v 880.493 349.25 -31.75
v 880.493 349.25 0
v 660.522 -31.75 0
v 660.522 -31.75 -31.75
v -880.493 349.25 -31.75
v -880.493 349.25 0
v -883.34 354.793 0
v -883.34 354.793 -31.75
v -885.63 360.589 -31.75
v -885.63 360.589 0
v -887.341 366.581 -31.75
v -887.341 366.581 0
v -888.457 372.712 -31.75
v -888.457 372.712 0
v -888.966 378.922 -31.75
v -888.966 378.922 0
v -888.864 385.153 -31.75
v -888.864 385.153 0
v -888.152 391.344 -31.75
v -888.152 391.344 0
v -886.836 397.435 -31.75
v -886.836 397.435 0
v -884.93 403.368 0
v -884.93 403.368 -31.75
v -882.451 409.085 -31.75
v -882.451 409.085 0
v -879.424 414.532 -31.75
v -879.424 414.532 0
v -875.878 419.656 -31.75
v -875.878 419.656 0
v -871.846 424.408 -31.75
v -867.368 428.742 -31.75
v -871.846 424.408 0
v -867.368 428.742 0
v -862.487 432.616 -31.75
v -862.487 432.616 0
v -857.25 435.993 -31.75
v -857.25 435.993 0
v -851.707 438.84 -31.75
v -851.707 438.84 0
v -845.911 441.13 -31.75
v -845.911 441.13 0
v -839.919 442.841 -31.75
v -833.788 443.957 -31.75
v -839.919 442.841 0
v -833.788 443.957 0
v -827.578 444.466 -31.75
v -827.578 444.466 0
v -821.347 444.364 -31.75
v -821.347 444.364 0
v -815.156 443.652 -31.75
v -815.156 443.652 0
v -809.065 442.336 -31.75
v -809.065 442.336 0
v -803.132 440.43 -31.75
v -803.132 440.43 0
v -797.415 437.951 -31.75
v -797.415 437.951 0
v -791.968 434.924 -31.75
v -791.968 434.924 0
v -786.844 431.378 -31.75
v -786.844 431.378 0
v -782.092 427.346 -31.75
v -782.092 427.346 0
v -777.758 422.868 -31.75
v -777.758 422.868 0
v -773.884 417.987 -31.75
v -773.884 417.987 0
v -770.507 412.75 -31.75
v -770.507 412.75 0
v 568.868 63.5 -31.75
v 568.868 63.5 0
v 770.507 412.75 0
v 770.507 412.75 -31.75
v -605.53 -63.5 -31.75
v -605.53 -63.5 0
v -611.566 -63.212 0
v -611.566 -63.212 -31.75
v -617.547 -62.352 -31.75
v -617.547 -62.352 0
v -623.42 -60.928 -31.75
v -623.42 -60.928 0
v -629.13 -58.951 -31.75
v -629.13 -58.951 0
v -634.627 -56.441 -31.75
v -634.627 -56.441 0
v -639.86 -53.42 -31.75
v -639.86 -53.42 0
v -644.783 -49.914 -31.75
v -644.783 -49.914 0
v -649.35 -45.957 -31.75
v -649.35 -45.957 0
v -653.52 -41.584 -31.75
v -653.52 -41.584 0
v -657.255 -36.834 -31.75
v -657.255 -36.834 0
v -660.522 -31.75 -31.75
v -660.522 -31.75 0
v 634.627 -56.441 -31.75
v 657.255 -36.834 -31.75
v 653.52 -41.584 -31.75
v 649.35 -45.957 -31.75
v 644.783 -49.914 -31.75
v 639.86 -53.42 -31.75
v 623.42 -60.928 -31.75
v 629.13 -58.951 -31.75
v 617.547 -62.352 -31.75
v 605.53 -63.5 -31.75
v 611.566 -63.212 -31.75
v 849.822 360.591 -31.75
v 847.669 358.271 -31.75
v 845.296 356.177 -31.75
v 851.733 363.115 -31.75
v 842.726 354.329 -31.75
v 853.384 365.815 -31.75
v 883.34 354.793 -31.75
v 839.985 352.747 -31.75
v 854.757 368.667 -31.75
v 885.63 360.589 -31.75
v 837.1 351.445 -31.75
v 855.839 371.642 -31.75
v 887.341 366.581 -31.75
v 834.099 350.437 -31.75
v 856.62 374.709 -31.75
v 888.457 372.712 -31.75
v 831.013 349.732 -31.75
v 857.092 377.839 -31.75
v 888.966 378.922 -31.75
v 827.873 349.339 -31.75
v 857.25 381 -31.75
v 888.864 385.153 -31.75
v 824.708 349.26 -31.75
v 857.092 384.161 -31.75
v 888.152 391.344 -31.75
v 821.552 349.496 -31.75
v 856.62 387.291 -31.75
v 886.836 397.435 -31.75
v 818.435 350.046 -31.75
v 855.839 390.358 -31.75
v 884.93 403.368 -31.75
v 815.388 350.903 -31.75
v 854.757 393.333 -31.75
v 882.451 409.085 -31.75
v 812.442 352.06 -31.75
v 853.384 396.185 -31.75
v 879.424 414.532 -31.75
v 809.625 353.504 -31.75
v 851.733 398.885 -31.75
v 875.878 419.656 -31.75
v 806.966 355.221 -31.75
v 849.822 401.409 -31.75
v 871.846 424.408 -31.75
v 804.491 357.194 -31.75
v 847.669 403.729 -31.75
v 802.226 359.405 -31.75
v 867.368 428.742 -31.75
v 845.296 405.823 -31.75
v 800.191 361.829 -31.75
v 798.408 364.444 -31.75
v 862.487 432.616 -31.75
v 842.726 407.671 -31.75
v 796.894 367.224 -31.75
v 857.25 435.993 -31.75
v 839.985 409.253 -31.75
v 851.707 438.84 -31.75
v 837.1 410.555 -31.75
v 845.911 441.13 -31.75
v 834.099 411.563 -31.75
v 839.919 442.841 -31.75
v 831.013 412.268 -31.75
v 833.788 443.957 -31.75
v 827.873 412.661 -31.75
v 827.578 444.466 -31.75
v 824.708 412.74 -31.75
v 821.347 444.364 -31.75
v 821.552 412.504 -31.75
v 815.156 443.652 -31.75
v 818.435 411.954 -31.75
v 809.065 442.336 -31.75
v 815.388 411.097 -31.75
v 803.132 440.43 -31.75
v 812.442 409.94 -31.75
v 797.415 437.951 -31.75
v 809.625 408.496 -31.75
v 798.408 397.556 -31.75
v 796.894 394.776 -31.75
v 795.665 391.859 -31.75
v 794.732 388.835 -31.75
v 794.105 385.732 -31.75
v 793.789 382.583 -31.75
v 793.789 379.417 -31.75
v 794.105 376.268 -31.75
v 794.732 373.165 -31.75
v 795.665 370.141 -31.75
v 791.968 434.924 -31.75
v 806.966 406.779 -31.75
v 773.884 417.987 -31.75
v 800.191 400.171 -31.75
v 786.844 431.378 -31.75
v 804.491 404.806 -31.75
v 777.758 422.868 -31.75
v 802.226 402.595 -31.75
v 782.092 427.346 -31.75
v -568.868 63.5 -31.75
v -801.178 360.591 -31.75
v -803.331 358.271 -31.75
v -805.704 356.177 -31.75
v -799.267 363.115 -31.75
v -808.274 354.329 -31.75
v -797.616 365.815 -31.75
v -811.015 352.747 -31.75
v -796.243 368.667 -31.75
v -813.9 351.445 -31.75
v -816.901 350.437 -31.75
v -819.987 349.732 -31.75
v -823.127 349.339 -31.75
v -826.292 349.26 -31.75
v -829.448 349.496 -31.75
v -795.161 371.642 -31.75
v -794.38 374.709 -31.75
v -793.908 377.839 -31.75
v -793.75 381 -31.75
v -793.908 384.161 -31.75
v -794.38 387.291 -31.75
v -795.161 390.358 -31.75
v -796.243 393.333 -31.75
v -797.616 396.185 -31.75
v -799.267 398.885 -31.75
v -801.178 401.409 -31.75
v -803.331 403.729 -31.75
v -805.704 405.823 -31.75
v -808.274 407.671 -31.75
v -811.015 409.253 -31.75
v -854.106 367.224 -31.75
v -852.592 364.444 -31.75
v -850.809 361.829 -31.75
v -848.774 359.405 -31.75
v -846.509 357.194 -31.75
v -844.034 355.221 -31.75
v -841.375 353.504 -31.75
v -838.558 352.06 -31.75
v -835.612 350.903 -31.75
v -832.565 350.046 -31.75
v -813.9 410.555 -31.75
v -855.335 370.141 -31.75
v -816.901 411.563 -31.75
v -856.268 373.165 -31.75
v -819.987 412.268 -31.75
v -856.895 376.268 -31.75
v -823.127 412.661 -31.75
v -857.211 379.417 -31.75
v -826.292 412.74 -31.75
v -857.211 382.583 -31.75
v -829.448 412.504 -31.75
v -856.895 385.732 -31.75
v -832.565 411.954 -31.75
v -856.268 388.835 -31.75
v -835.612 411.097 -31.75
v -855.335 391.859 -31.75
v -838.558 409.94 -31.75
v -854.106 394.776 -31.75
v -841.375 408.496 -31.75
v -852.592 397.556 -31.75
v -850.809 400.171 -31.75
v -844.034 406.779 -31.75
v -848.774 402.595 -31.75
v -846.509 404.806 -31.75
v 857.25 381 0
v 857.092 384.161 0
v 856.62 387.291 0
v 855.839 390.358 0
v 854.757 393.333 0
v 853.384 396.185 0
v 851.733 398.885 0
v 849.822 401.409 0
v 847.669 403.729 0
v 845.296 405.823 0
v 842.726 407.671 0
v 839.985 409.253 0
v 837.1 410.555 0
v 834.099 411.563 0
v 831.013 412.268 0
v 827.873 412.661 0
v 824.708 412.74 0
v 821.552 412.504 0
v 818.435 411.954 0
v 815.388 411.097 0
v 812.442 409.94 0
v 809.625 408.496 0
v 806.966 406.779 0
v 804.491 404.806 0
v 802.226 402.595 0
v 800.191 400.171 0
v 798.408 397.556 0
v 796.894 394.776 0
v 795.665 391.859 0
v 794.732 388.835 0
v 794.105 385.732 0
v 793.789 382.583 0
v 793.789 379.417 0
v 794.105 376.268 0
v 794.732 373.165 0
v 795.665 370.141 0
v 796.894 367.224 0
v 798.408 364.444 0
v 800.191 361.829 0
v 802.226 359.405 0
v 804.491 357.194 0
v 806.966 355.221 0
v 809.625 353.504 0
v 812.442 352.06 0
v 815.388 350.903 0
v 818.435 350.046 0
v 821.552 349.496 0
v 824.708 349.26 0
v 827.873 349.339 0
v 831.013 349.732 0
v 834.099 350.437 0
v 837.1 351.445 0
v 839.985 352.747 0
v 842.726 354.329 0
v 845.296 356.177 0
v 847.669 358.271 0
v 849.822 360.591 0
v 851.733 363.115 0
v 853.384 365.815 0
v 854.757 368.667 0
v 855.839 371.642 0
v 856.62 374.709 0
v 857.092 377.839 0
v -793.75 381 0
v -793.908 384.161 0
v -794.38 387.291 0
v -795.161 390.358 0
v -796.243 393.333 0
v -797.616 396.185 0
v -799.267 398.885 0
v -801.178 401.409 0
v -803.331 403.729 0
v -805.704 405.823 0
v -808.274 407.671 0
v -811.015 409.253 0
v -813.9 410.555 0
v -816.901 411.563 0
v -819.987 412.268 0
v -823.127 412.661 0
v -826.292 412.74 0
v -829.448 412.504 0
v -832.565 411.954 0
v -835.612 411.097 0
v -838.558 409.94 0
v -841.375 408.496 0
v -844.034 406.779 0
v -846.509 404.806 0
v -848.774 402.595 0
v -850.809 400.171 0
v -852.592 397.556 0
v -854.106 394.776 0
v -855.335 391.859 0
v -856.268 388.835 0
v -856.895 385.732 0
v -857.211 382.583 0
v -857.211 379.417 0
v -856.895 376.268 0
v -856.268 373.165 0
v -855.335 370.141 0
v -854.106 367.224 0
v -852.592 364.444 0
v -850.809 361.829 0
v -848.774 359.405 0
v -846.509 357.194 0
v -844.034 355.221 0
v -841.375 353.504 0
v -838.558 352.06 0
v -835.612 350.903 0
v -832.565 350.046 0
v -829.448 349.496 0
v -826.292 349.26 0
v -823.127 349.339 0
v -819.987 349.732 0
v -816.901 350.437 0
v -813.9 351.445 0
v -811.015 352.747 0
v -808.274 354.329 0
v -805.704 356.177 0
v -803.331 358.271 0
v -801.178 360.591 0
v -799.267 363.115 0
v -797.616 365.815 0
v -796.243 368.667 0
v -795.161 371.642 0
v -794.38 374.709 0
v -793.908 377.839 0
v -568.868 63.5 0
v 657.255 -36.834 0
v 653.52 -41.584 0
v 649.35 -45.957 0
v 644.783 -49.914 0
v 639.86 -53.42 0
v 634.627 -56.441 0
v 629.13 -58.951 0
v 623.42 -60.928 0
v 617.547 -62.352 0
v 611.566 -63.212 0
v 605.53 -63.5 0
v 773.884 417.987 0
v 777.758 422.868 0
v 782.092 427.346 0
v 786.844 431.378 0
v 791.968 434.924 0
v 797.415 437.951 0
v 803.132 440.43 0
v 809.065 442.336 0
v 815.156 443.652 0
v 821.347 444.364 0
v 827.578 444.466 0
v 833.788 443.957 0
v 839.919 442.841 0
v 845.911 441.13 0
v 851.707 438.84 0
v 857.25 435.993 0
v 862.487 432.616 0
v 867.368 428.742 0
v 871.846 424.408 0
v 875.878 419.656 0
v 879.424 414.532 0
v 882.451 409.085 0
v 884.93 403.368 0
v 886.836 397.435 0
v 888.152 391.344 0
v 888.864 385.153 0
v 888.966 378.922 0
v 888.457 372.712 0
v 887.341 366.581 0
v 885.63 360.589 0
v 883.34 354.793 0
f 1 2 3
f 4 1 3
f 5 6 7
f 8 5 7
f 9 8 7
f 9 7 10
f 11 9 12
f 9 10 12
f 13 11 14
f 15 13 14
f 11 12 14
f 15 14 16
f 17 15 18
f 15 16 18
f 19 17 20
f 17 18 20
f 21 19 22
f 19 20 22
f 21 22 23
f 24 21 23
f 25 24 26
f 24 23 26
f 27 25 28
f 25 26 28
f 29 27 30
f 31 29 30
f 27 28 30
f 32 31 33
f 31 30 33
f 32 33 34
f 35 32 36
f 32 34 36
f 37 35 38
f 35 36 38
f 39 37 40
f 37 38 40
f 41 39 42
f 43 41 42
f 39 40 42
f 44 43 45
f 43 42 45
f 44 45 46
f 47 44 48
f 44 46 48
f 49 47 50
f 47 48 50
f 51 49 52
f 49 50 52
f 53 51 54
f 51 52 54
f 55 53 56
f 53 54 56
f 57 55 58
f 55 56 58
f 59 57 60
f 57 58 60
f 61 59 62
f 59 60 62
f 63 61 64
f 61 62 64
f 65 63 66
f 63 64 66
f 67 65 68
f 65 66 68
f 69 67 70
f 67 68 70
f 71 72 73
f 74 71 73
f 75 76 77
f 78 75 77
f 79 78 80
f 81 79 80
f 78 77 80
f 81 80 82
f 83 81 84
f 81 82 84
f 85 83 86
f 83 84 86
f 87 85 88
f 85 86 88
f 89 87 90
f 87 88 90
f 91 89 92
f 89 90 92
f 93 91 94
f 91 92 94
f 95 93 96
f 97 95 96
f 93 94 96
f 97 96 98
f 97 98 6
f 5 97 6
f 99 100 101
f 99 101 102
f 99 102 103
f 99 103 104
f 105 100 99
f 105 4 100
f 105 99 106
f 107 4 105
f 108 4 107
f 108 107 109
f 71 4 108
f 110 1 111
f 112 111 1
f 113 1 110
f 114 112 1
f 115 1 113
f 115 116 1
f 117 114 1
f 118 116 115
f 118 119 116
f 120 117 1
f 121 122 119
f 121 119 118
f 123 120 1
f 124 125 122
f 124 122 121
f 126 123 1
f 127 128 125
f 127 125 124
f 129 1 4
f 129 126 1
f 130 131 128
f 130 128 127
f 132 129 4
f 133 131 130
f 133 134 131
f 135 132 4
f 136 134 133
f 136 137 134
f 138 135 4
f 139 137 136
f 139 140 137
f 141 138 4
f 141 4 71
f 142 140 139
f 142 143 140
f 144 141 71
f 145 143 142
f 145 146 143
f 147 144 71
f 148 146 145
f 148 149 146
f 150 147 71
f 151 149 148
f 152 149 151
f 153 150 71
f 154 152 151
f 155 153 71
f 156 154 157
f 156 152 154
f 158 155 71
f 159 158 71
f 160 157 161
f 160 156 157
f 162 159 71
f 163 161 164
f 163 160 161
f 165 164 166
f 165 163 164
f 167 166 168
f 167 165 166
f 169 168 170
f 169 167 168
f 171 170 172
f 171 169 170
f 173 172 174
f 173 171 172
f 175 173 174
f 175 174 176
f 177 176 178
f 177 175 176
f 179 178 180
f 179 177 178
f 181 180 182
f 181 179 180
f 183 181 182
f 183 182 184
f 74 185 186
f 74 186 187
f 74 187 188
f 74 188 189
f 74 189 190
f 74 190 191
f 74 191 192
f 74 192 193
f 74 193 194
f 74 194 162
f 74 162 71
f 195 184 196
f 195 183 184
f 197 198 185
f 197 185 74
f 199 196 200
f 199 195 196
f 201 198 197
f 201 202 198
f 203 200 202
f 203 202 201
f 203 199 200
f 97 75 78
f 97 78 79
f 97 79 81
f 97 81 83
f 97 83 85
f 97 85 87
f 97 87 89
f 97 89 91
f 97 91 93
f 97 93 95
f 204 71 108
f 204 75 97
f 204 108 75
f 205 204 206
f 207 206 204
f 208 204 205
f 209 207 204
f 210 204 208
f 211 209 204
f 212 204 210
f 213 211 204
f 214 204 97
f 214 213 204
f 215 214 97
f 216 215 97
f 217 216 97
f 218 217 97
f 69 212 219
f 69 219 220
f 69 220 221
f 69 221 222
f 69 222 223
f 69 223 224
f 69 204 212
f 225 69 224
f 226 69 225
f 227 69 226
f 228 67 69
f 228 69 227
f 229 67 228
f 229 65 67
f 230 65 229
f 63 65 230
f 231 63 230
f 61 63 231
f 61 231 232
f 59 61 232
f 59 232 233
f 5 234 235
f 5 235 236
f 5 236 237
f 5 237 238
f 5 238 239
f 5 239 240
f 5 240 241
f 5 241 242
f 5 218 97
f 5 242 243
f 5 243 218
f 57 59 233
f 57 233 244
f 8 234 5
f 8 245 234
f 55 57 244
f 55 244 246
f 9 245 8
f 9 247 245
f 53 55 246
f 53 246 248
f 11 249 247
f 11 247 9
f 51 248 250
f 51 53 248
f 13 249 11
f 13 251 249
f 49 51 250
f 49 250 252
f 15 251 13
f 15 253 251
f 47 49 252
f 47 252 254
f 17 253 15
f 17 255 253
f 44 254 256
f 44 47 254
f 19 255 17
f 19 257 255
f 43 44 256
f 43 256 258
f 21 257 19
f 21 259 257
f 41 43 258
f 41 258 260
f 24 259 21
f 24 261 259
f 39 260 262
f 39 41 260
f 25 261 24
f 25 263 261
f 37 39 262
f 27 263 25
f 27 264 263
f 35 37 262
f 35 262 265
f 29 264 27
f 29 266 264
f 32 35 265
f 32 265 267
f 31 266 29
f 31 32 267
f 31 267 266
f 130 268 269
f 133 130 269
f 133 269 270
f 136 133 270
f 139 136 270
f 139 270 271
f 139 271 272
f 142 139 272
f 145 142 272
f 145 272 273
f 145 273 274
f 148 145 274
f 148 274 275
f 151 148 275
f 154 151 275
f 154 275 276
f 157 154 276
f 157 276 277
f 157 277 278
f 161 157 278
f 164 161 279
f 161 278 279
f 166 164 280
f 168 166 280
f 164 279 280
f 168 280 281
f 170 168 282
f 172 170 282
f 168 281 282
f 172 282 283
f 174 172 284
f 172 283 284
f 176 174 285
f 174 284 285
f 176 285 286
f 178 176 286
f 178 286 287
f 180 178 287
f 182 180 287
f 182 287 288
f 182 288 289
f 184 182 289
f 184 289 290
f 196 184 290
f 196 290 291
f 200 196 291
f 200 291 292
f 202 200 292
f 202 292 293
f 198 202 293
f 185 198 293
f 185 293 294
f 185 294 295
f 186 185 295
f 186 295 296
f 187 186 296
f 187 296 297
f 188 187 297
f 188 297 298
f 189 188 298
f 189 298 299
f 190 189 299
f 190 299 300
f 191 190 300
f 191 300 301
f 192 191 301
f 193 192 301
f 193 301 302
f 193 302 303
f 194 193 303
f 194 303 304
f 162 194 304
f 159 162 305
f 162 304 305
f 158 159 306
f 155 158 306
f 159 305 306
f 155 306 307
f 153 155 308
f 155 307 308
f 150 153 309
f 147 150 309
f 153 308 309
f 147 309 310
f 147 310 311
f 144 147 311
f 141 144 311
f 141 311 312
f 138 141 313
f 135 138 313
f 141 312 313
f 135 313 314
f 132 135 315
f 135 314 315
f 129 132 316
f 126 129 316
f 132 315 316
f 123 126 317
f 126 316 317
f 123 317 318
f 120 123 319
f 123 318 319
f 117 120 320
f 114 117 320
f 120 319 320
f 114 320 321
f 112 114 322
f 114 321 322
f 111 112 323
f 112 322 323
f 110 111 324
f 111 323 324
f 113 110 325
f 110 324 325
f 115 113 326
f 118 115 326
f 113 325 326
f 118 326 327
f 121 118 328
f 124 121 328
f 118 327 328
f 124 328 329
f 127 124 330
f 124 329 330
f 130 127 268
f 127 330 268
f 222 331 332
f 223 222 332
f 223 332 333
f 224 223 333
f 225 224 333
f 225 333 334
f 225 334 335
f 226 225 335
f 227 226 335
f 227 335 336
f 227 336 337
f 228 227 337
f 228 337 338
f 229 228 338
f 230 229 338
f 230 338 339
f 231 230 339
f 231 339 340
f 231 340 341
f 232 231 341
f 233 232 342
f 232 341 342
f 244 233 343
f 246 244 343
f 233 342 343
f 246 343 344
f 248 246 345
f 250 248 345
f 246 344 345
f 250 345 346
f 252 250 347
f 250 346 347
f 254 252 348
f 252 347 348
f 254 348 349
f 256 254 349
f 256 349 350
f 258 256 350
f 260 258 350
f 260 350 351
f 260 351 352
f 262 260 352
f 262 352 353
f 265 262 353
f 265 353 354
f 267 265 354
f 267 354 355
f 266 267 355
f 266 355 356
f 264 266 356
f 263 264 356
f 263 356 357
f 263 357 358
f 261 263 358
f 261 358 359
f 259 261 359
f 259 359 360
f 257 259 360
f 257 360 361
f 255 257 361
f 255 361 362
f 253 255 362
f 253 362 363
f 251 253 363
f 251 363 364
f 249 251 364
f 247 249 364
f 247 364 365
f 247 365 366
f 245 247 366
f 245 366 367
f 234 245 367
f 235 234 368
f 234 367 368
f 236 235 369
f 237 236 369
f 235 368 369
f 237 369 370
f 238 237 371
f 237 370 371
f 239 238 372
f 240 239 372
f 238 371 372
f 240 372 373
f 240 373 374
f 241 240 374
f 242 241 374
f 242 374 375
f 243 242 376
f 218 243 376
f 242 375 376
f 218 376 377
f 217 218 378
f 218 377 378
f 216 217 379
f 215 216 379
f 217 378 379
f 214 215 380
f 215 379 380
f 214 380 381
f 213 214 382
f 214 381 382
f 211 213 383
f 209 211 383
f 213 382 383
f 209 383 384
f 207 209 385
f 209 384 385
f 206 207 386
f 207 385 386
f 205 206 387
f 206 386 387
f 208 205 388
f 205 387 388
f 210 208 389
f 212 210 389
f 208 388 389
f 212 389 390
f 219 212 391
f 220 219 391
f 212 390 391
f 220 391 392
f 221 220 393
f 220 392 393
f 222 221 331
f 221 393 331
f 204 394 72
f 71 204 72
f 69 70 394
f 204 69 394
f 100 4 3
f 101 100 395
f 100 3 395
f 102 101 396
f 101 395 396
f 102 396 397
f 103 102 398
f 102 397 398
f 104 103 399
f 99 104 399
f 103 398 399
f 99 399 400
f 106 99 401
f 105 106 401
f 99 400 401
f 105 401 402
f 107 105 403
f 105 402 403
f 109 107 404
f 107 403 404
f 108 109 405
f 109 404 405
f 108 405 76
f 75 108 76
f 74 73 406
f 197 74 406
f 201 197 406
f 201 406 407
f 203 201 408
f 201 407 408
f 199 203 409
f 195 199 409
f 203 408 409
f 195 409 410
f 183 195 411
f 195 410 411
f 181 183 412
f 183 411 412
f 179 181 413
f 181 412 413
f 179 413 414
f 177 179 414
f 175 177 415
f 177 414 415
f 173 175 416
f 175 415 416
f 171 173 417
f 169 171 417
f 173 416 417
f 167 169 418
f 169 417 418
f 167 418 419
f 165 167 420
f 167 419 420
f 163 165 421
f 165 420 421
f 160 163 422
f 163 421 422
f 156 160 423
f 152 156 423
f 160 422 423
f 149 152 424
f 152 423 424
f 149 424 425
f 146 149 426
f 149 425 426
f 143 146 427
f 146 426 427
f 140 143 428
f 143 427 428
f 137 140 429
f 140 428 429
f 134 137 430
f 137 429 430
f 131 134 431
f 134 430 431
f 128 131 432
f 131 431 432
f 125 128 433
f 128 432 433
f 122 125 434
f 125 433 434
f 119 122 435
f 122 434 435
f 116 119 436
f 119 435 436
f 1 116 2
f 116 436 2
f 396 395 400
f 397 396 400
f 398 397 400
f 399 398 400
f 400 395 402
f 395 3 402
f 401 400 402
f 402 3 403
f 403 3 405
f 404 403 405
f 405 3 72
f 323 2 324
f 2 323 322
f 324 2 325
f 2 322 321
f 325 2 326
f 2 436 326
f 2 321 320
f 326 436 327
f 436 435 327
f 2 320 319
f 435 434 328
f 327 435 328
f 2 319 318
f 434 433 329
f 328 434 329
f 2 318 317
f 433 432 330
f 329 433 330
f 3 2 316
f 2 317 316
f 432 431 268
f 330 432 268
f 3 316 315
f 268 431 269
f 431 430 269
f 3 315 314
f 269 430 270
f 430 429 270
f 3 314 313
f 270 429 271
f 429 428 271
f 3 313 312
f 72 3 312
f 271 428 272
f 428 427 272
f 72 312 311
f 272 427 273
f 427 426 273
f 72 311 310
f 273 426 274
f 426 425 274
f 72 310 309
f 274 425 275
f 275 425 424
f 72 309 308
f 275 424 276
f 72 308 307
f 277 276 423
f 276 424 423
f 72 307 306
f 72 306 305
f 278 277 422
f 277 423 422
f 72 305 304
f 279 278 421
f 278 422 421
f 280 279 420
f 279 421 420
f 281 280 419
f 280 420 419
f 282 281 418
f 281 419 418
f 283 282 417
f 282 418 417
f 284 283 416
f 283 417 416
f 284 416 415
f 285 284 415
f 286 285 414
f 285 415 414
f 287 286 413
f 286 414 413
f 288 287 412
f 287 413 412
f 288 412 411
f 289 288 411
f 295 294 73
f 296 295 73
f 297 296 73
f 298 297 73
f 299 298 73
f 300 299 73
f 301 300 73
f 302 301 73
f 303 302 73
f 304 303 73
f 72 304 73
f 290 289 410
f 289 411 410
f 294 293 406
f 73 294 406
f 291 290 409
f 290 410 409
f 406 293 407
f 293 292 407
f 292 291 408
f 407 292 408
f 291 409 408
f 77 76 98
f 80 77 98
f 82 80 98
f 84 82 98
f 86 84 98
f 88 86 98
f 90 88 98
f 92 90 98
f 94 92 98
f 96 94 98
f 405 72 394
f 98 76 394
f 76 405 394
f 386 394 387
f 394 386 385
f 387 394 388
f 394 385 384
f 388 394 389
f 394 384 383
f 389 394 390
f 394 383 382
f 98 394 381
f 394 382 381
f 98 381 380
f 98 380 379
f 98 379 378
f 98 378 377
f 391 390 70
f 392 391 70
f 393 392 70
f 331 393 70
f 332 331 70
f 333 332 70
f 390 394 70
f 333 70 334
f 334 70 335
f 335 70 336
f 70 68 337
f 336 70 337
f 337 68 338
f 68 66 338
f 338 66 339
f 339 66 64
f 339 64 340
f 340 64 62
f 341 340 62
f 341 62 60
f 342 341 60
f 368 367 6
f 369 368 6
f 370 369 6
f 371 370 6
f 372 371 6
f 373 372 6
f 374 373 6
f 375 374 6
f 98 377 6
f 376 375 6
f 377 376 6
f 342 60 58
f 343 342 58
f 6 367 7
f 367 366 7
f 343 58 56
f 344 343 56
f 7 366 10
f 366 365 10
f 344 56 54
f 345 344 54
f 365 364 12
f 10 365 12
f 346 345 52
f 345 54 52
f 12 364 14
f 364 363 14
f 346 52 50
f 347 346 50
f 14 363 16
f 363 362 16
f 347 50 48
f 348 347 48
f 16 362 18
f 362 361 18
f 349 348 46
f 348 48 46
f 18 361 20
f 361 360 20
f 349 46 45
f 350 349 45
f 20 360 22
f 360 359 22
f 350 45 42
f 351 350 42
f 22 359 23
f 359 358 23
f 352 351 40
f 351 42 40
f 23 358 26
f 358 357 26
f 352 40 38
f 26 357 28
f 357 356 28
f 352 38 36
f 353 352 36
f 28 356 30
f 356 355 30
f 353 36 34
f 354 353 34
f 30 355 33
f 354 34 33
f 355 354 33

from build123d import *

# Parameters (mm, degrees)
BOSS_EXTRUDE1_DEPTH = 31.75
SKETCH2_R           = 31.75
CUT_EXTRUDE1_DEPTH  = 995.439194974


with BuildPart() as part:
    # Sketch1 → Boss-Extrude1 (new body)
    with BuildSketch(Plane.XY):
        with BuildLine():
            Line((-605.529547439, 63.5), (605.529547439, 63.5))
            ThreePointArc((605.529547439, 63.5), (669.029547439, 0), (605.529547439, -63.5))
            Line((605.529547439, -63.5), (-605.529547439, -63.5))
            ThreePointArc((-605.529547439, -63.5), (-669.029547439, 0), (-605.529547439, 63.5))
        make_face()
        with BuildLine():
            Line((550.536934298, 31.75), (770.50738686, 412.75))
            ThreePointArc((770.50738686, 412.75), (857.25, 435.99261314), (880.49261314, 349.25))
            Line((880.49261314, 349.25), (660.522160579, -31.75))
            ThreePointArc((660.522160579, -31.75), (573.779547439, -54.99261314), (550.536934298, 31.75))
        make_face()
        with BuildLine():
            Line((-660.522160579, -31.75), (-880.49261314, 349.25))
            ThreePointArc((-880.49261314, 349.25), (-857.25, 435.99261314), (-770.50738686, 412.75))
            Line((-770.50738686, 412.75), (-550.536934298, 31.75))
            ThreePointArc((-550.536934298, 31.75), (-573.779547439, -54.99261314), (-660.522160579, -31.75))
        make_face()
    extrude(amount=-BOSS_EXTRUDE1_DEPTH)

    # Sketch2 → Cut-Extrude1 (cut, through all)
    with BuildSketch(Plane.XY):
        with Locations((825.5, 381)):
            Circle(SKETCH2_R)
        with Locations((-825.5, 381)):
            Circle(SKETCH2_R)
    extrude(amount=-CUT_EXTRUDE1_DEPTH, mode=Mode.SUBTRACT)


solid = part.part
